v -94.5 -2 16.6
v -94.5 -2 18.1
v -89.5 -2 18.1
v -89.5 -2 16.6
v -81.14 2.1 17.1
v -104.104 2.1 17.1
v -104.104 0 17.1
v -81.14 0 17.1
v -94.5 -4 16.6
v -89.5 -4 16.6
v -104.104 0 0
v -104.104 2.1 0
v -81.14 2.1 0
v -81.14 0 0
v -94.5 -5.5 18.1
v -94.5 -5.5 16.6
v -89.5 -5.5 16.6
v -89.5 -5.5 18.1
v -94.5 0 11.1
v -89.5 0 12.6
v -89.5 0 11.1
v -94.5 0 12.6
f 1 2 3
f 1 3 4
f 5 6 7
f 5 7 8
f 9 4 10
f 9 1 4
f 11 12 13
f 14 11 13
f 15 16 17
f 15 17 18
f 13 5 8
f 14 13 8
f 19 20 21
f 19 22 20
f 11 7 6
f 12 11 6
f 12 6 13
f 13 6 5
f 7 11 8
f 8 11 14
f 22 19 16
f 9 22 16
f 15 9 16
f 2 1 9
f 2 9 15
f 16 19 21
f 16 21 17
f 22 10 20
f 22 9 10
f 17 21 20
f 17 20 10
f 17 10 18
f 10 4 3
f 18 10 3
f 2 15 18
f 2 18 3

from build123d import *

# Parameters (mm, degrees)
CROQUIS1_W                   = 184
CROQUIS1_H                   = 39
SALIENTE_EXTRUIR1_DEPTH      = 17.1
CROQUIS3_W                   = 179.8
CROQUIS3_H                   = 34.8
CORTAR_EXTRUIR2_DEPTH        = 5
CROQUIS2_R                   = 0.8
CROQUIS2_W                   = 48
CROQUIS2_H                   = 1.8
CROQUIS2_W_2                 = 35
CROQUIS2_H_2                 = 5.5
CORTAR_EXTRUIR1_DEPTH        = 10
SALIENTE_EXTRUIR2_START      = -30
CROQUIS4_R                   = 1.7
SALIENTE_EXTRUIR2_DEPTH      = 10
CROQUIS5_R                   = 3
CORTAR_EXTRUIR3_DEPTH        = 2
REDONDEO1_R                  = 3
SALIENTE_EXTRUIR3_START      = -92
SALIENTE_EXTRUIR3_DEPTH      = 2.5
SALIENTE_EXTRUIR3_DEPTH_BACK = 2.5
CORTAR_EXTRUIR4_DEPTH        = 10
CORTAR_EXTRUIR4_DEPTH_BACK   = 17.1


with BuildPart() as part:
    # Croquis1 → Saliente-Extruir1 (new body)
    with BuildSketch(Plane.XY):
        with Locations((-92, 19.5)):
            Rectangle(CROQUIS1_W, CROQUIS1_H)
    extrude(amount=SALIENTE_EXTRUIR1_DEPTH)

    # Croquis3 → Cortar-Extruir2 (cut)
    with BuildSketch(Plane.XY.offset(17.1)):
        with Locations((-92, 19.5)):
            Rectangle(CROQUIS3_W, CROQUIS3_H)
    extrude(amount=-CORTAR_EXTRUIR2_DEPTH, mode=Mode.SUBTRACT)

    # Croquis2 → Cortar-Extruir1 (cut)
    with BuildSketch(Plane.XY.offset(12.1)):
        with Locations((-12.681707673, 9.800192895)):
            Circle(CROQUIS2_R)
        with Locations((-6.682537242, 9.700422497)):
            Circle(CROQUIS2_R)
        with BuildLine():
            Line((-105.9, 34.7), (-105.9, 36.2))
            Line((-105.9, 36.2), (-95.9, 36.2))
            Line((-95.9, 36.2), (-95.9, 34.7))
            Line((-95.9, 34.7), (-8.9, 34.7))
            ThreePointArc((-8.9, 34.7), (-3.7, 26.2), (-8.9, 17.7))
            Line((-8.9, 17.7), (-17.9, 17.7))
            Line((-17.9, 17.7), (-17.9, 15.7))
            Line((-17.9, 15.7), (-23.9, 15.7))
            Line((-23.9, 15.7), (-23.9, 17.7))
            Line((-23.9, 17.7), (-64.109855844, 17.7))
            Line((-64.109855844, 17.7), (-64.109855844, 5.8))
            Line((-64.109855844, 5.8), (-136.109855844, 5.8))
            Line((-136.109855844, 5.8), (-136.109855844, 8.4))
            Line((-136.109855844, 8.4), (-166.109855844, 8.4))
            ThreePointArc((-166.109855844, 8.4), (-179.9, 11.3), (-166.109855844, 14.2))
            Line((-166.109855844, 14.2), (-136.109855844, 14.2))
            Line((-136.109855844, 14.2), (-136.109855844, 16.8))
            Line((-136.109855844, 16.8), (-91.9, 16.8))
            Line((-91.9, 16.8), (-91.9, 17.7))
            Line((-91.9, 17.7), (-108.9, 17.7))
            Line((-108.9, 17.7), (-108.9, 22.7))
            Line((-108.9, 22.7), (-127.377811725, 22.7))
            ThreePointArc((-127.377811725, 22.7), (-147.1, 14.7), (-166.822188275, 22.7))
            Line((-166.822188275, 22.7), (-179.9, 22.7))
            Line((-179.9, 22.7), (-179.9, 33.7))
            Line((-179.9, 33.7), (-108.9, 33.7))
            Line((-108.9, 33.7), (-108.9, 34.7))
            Line((-108.9, 34.7), (-105.9, 34.7))
        make_face()
        with Locations((-28.1, 6.7)):
            Rectangle(CROQUIS2_W, CROQUIS2_H)
        with Locations((-44.309855844, 12.65)):
            Rectangle(CROQUIS2_W_2, CROQUIS2_H_2)
    extrude(amount=-CORTAR_EXTRUIR1_DEPTH, mode=Mode.SUBTRACT)

    # Redondeo1
    redondeo1_edges = [part.edges().sort_by_distance(p)[0] for p in [
        (-2.1, 2.1, 14.6),
        (-181.9, 2.1, 14.6),
        (-181.9, 36.9, 14.6),
        (-2.1, 36.9, 14.6),
        (0, 0, 8.55),
        (-184, 0, 8.55),
        (-184, 39, 8.55),
        (0, 39, 8.55),
    ]]
    fillet(redondeo1_edges, radius=REDONDEO1_R)


with BuildPart() as body_2:
    # Croquis4 → Saliente-Extruir2 (new body)
    with BuildSketch(Plane.ZY.offset(184).offset(SALIENTE_EXTRUIR2_START)):
        with BuildLine():
            Line((17.1, 40.5), (17.1, 39))
            Line((17.1, 39), (12.1, 39))
            Line((12.1, 39), (12.1, 45.5))
            ThreePointArc((12.1, 45.5), (20.635533906, 49.035533906), (17.1, 40.5))
        make_face()
        with Locations((17.1, 45.5)):
            Circle(CROQUIS4_R, mode=Mode.SUBTRACT)
    extrude(amount=-SALIENTE_EXTRUIR2_DEPTH)

    # Croquis5 → Cortar-Extruir3 (cut)
    with BuildSketch(Plane.ZY.offset(154)):
        with Locations((17.1, 45.5)):
            Circle(CROQUIS5_R)
    extrude(amount=-CORTAR_EXTRUIR3_DEPTH, mode=Mode.SUBTRACT)


with BuildPart() as body_3:
    # Simetría1: mirrored copy
    add(body_2.part.mirror(Plane.ZY.offset(92)))


with BuildPart() as body_4:
    # Croquis6 → Saliente-Extruir3 (new body, two sides)
    with BuildSketch(Plane.ZY.offset(184).offset(SALIENTE_EXTRUIR3_START)) as saliente_extruir3_sk:
        Polygon((12.6, 0), (11.1, 0), (16.6, -5.5), (18.1, -5.5), (18.1, -2), (16.6, -2), (16.6, -4), align=None)
    extrude(amount=SALIENTE_EXTRUIR3_DEPTH)
    extrude(saliente_extruir3_sk.sketch, amount=-SALIENTE_EXTRUIR3_DEPTH_BACK)


with BuildPart() as cortar_extruir4_tool:
    # Croquis7 → Cortar-Extruir4 (new body, two sides)
    with BuildSketch(Plane.XY.offset(17.1)) as cortar_extruir4_sk:
        Polygon((-104.103810704, 2.1), (-81.140118855, 2.1), (-81.140118855, -8.804149183), (14.735599425, -8.804149183), (14.735599425, 62.484025979), (-194.207904524, 65.472415393), (-195.251591169, -7.500518981), (-104.103810704, -8.804149183), align=None)
    extrude(amount=CORTAR_EXTRUIR4_DEPTH)
    extrude(cortar_extruir4_sk.sketch, amount=-CORTAR_EXTRUIR4_DEPTH_BACK)


with BuildPart() as part_1:
    add(part.part)

    # Cortar-Extruir4: cut by cortar_extruir4_tool
    add(cortar_extruir4_tool.part, mode=Mode.SUBTRACT)


with BuildPart() as body_2_1:
    add(body_2.part)

    # Cortar-Extruir4: cut by cortar_extruir4_tool
    add(cortar_extruir4_tool.part, mode=Mode.SUBTRACT)


with BuildPart() as body_3_1:
    add(body_3.part)

    # Cortar-Extruir4: cut by cortar_extruir4_tool
    add(cortar_extruir4_tool.part, mode=Mode.SUBTRACT)


solid = Compound([body_4.part, part_1.part])
